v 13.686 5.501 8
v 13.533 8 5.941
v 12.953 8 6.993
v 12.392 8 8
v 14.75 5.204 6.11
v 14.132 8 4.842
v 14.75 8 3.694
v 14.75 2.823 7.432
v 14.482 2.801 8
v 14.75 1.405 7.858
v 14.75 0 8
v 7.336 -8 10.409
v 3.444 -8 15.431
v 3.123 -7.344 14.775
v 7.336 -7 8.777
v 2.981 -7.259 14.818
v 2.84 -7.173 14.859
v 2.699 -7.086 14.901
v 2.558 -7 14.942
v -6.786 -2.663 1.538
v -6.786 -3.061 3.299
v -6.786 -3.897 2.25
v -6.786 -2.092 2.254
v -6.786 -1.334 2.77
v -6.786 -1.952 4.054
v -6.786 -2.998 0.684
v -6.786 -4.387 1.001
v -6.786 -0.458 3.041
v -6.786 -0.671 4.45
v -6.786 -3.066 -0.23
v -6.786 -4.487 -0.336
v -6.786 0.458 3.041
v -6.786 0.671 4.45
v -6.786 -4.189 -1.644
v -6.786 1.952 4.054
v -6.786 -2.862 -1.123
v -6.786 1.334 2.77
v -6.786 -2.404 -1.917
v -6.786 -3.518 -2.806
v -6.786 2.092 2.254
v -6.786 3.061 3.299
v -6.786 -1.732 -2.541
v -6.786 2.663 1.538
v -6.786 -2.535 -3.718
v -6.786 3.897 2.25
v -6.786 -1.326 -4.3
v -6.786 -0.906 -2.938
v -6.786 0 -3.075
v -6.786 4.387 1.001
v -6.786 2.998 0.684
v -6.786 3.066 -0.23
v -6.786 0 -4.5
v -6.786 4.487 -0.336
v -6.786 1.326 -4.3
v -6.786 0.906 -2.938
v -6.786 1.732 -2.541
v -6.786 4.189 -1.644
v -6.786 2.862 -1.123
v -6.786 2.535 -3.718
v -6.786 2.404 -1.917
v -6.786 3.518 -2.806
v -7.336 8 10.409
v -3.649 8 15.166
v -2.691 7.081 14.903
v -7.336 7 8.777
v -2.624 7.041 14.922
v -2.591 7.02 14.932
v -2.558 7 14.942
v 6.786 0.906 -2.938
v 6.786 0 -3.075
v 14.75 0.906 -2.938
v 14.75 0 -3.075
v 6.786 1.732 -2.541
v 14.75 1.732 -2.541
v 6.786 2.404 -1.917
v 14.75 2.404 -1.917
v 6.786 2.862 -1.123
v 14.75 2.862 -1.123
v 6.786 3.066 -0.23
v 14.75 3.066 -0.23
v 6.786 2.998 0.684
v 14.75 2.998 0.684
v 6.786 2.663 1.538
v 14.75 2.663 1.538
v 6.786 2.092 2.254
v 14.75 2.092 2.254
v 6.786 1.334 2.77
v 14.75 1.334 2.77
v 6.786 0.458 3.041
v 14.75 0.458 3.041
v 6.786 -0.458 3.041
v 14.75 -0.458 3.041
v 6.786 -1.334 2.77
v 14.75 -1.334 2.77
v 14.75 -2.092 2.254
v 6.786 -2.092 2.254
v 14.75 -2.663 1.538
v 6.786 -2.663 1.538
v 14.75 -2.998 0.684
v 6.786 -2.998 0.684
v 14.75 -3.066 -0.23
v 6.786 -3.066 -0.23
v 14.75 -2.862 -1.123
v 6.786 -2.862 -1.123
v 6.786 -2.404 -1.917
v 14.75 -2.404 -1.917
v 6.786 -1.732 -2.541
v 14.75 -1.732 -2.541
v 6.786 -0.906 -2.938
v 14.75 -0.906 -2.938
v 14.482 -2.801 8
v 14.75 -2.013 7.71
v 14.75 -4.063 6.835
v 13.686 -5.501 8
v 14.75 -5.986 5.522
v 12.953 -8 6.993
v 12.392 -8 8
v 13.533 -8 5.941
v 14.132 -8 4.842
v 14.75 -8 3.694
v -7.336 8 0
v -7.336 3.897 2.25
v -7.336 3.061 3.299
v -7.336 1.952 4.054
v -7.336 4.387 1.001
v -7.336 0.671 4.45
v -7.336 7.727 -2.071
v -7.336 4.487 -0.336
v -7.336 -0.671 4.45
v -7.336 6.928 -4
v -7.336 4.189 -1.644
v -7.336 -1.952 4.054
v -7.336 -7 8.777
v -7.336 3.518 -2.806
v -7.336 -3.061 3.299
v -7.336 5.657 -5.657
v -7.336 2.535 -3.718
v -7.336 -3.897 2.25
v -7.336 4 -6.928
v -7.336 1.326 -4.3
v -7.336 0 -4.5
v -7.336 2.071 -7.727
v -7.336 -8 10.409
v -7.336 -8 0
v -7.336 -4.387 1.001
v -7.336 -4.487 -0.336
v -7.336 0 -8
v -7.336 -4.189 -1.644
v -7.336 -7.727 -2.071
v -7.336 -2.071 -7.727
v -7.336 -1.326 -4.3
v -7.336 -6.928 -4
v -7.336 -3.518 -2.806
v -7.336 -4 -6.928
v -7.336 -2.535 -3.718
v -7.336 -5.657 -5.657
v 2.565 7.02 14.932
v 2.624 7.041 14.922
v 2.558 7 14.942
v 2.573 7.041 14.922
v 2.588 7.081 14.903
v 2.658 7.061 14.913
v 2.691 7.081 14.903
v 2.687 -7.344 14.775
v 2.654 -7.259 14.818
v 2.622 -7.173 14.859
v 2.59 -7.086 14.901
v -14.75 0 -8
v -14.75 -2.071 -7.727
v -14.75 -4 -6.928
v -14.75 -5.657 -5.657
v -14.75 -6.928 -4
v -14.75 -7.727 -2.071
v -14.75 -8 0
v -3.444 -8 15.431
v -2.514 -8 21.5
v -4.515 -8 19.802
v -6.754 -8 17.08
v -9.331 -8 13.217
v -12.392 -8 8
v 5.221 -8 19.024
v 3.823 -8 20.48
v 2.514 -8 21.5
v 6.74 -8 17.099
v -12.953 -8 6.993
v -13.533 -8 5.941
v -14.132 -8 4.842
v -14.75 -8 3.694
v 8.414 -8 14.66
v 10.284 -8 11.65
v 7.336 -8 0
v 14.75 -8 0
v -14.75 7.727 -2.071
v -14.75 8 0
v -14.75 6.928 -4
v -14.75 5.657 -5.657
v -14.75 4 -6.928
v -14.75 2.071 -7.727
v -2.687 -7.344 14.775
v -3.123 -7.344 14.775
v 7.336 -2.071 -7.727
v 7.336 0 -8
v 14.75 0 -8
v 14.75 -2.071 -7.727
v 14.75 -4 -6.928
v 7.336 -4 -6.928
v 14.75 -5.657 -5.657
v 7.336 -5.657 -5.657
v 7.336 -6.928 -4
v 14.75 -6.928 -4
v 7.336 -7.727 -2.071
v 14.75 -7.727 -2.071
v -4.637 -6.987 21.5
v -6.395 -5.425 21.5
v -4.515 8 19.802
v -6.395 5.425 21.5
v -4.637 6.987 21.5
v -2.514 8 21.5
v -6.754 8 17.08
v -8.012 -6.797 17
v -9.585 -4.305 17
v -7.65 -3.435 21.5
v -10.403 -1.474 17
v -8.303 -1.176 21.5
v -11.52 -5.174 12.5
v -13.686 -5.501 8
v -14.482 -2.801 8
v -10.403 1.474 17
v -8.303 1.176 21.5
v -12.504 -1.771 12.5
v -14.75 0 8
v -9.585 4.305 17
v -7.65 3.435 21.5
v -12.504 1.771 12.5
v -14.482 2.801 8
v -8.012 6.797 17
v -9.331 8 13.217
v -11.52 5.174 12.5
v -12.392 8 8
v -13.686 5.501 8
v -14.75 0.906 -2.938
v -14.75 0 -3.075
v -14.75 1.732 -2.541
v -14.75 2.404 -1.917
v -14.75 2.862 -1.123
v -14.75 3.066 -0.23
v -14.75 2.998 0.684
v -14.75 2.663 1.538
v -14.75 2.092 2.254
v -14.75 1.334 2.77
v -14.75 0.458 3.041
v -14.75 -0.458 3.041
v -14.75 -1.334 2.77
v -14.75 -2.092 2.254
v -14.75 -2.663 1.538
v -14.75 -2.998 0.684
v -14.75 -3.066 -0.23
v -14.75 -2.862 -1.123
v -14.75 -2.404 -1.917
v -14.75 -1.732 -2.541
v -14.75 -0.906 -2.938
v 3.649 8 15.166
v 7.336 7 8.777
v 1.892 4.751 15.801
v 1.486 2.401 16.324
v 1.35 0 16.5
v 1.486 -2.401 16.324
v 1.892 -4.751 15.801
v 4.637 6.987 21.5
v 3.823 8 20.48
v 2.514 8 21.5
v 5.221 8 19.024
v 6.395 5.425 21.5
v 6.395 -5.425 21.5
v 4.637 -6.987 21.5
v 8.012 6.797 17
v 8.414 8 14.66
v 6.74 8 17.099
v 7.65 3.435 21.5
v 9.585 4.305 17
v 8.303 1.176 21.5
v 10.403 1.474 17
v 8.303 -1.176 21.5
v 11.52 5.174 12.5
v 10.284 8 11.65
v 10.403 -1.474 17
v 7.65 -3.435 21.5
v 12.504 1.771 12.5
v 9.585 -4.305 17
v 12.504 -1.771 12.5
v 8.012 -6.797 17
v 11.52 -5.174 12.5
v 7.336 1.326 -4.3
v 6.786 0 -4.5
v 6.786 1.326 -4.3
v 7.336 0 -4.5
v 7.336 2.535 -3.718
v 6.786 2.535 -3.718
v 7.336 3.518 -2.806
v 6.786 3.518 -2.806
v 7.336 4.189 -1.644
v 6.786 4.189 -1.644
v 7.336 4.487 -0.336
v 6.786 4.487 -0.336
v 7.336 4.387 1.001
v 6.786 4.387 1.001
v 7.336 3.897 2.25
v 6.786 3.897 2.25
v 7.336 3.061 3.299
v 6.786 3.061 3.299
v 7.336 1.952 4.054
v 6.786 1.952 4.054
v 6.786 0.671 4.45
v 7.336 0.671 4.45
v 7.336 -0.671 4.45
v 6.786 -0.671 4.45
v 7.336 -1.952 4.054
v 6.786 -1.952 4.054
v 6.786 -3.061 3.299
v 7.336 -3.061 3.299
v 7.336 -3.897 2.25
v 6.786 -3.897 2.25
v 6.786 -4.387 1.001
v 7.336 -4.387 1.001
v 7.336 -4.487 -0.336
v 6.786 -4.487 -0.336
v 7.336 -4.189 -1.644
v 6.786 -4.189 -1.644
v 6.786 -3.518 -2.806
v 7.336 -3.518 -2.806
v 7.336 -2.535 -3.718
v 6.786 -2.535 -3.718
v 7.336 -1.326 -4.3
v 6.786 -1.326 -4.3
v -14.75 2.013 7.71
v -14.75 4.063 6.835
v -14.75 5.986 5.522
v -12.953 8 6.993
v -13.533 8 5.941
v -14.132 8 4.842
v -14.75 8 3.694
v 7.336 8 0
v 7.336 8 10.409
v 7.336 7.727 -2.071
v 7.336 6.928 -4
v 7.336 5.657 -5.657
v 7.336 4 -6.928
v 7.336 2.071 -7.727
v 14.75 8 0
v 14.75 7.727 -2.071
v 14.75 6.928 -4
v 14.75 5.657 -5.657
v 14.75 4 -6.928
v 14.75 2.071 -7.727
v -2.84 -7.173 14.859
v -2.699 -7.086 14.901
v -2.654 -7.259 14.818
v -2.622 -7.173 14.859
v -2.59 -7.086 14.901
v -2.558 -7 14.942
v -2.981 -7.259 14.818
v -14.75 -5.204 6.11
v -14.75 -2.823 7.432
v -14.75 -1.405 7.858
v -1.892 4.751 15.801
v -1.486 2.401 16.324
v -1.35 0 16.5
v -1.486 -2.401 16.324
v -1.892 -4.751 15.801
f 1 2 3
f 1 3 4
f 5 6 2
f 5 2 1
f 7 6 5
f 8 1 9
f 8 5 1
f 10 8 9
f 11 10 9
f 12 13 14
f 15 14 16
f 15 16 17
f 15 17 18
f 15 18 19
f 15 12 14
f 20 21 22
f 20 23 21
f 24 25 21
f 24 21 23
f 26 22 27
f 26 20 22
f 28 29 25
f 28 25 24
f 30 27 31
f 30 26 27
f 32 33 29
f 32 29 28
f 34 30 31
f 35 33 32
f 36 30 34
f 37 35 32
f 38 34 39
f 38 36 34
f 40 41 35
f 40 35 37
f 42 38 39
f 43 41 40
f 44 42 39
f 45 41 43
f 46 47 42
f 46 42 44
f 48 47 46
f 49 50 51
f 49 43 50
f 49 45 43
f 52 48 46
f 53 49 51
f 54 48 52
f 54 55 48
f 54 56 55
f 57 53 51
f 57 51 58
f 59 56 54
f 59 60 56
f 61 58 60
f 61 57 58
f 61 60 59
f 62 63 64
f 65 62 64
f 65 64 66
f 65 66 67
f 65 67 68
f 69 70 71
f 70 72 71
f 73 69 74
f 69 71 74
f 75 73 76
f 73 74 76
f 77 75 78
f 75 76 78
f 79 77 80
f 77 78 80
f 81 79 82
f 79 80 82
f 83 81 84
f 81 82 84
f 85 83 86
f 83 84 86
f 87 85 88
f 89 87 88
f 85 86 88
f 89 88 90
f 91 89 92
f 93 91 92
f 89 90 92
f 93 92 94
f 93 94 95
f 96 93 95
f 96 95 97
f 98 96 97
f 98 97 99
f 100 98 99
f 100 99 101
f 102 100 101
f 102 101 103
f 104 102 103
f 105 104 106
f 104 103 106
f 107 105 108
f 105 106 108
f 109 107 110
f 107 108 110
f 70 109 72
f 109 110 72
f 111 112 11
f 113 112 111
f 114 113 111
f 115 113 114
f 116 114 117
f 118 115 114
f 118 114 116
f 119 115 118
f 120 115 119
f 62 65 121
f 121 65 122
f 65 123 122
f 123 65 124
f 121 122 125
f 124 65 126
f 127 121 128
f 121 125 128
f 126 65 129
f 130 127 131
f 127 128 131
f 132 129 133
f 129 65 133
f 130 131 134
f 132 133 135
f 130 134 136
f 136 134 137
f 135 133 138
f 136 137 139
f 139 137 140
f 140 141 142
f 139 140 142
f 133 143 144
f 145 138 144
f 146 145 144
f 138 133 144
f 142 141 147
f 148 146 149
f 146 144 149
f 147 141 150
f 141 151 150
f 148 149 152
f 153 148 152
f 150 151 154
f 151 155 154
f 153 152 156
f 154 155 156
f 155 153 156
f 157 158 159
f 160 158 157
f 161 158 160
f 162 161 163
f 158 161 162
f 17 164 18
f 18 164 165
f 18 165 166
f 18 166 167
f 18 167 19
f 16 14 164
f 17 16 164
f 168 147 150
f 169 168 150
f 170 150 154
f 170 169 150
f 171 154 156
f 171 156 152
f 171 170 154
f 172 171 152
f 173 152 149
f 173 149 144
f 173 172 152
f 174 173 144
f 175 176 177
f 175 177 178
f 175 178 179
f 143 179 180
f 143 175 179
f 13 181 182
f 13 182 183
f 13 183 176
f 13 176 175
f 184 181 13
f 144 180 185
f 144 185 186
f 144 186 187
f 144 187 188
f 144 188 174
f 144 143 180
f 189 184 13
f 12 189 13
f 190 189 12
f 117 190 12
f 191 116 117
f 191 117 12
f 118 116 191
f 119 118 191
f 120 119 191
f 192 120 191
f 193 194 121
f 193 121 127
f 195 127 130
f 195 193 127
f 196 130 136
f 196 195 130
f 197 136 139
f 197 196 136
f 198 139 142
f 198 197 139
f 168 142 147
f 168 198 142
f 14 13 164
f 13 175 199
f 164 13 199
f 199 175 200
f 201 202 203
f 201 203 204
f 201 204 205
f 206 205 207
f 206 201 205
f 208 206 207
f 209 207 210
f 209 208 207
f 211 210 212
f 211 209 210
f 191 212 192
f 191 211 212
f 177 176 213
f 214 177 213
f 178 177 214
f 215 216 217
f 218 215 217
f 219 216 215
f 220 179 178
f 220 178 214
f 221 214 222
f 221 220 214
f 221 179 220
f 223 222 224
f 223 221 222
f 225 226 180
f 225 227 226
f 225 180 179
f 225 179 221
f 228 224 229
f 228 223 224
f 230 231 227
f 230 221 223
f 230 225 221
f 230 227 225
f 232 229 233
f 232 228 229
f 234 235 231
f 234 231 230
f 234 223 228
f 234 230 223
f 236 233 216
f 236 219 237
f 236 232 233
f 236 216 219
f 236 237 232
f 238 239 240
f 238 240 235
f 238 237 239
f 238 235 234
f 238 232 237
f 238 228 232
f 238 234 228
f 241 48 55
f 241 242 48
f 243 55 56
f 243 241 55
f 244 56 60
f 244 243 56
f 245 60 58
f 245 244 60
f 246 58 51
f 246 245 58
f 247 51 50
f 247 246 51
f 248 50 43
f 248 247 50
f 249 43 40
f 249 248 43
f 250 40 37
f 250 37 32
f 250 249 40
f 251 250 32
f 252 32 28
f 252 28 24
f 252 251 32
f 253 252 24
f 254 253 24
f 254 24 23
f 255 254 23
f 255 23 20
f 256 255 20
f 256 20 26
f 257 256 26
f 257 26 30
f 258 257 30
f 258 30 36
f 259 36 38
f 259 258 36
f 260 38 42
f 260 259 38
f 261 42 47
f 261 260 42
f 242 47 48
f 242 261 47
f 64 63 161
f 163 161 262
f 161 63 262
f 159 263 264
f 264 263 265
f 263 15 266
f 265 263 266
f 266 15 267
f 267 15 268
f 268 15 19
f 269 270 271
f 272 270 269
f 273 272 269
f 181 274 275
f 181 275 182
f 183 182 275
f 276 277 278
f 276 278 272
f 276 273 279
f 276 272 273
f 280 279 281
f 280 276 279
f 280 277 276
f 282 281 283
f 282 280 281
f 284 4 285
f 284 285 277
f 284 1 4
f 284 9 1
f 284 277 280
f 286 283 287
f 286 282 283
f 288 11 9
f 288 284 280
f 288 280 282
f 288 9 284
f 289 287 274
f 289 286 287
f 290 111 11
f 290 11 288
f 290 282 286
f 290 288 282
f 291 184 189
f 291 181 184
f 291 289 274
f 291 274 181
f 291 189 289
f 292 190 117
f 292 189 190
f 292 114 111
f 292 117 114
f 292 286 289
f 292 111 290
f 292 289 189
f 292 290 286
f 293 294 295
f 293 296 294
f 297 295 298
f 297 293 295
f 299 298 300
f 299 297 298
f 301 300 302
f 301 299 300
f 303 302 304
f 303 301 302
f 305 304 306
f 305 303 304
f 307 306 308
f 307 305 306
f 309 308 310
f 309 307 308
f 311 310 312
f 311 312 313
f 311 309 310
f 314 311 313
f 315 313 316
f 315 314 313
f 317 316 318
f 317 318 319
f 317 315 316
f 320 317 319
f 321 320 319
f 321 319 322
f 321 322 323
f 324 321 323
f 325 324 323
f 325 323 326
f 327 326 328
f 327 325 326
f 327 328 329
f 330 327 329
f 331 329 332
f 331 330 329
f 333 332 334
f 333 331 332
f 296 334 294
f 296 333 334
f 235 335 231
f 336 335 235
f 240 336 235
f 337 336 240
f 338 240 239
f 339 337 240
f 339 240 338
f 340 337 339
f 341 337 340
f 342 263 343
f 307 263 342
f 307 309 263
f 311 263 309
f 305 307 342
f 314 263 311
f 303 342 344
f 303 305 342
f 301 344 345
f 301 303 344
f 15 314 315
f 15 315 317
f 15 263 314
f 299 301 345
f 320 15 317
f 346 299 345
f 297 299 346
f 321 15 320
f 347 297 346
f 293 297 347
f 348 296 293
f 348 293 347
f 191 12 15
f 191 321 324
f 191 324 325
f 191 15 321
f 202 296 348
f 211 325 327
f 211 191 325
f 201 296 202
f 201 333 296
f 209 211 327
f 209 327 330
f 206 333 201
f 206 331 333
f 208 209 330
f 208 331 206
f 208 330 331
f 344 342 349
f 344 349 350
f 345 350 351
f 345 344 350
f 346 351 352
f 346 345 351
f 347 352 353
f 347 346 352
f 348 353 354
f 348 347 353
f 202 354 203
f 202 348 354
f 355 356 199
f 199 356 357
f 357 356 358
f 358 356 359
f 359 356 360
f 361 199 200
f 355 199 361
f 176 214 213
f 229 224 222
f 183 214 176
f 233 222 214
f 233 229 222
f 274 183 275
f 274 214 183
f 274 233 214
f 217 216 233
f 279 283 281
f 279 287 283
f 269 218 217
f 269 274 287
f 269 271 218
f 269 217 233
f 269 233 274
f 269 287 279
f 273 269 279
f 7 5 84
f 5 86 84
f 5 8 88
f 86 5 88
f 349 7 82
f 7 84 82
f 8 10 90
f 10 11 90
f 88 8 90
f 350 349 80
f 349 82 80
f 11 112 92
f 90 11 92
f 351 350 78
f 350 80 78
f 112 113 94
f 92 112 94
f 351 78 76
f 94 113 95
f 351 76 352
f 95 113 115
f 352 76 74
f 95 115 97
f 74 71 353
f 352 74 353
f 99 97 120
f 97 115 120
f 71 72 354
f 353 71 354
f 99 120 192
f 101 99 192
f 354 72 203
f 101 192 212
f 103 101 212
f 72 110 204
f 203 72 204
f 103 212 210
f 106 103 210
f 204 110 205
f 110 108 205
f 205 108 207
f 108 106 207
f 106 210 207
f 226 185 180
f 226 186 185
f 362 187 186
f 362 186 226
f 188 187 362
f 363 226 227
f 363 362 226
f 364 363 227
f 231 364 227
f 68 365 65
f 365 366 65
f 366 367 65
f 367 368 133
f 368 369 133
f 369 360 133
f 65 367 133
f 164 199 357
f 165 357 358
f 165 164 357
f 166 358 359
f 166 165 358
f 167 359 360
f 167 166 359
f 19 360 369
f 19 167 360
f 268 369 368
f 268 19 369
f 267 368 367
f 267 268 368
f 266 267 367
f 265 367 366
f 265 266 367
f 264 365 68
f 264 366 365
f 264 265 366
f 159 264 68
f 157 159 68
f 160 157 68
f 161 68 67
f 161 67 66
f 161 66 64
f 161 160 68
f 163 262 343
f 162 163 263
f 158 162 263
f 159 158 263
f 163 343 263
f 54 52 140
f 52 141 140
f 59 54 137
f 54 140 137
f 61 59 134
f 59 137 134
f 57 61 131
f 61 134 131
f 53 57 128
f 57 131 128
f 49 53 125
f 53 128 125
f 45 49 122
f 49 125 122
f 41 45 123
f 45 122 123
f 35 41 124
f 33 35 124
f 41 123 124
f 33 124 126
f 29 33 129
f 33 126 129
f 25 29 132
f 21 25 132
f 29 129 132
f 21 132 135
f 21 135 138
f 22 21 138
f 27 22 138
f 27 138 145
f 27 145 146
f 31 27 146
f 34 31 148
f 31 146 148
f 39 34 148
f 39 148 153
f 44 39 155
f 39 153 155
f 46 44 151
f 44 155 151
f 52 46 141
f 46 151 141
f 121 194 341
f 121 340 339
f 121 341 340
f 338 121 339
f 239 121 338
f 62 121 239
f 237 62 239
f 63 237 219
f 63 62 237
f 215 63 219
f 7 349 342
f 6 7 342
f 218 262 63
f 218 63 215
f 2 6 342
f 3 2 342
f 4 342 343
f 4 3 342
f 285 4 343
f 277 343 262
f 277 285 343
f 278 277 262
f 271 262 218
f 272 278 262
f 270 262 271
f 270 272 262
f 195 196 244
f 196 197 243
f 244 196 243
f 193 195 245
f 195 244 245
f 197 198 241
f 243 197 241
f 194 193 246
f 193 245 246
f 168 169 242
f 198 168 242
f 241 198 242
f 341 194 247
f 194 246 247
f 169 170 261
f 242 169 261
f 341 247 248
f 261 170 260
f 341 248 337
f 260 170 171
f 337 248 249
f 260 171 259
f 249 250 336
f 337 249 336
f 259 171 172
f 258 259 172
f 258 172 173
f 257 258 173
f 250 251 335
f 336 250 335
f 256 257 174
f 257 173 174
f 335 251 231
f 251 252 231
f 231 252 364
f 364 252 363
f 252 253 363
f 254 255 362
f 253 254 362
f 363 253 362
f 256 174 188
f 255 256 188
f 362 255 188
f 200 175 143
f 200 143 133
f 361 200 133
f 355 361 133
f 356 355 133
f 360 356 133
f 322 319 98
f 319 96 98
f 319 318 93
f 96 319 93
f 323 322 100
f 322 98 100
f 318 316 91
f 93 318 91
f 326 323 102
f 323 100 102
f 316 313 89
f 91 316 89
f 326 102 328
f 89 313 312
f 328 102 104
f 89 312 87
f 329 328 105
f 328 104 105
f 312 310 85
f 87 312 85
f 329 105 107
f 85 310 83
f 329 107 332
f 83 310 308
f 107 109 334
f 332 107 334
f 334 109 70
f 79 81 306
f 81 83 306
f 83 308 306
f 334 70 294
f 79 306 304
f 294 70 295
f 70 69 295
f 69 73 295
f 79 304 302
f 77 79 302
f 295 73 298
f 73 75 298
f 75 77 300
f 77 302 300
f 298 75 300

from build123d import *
from OCP.BRepFilletAPI import BRepFilletAPI_MakeChamfer

# Parameters (mm, degrees)
BOSS_EXTRUDE1_DEPTH             = 8
BOSS_EXTRUDE1_DEPTH_BACK        = 8
CUT_EXTRUDE1_DEPTH              = 31.525604007
CUT_EXTRUDE1_DEPTH_BACK         = 31.525604007
SKETCH2_R                       = 3.075
SKETCH4_W                       = 0.549849448
SKETCH4_H                       = 1.425
BOSS_EXTRUDE2_REACH             = 32.526
BOSS_EXTRUDE2_DIRECTION_2_REACH = 32.526
CUT_EXTRUDE3_DEPTH              = 38.467485904
CUT_EXTRUDE3_DEPTH_BACK         = 4
SKETCH12_R                      = 2
CHAMFER1_SIZE                   = 0.5
CHAMFER1_SIZE2                  = 1.045792293
CHAMFER2_SIZE                   = 1
CHAMFER2_SIZE_2                 = 0.735593413


with BuildPart() as part:
    # Sketch1 → Boss-Extrude1 (new, two sides: drawn at the far end of the back side and taken through both)
    with BuildSketch(Plane(origin=(0, 0, 0), x_dir=(1, 0, 0), z_dir=(0, 1, 0)).offset(-BOSS_EXTRUDE1_DEPTH_BACK)):
        Polygon((-7.336249448, 8), (-14.75, 8), (-14.75, -8), (-6.5, -25.5), (6.5, -25.5), (14.75, -8), (14.75, 8), (7.336249448, 8), (7.336249448, -8.776914416), (1.35, -16.5), (-1.35, -16.5), (-7.336249448, -8.776914416), align=None)
    extrude(amount=BOSS_EXTRUDE1_DEPTH + BOSS_EXTRUDE1_DEPTH_BACK)

    # Sketch2 → Cut-Extrude1 (cut, two sides: drawn at the far end of the back side and taken through both)
    with BuildSketch(Plane(origin=(0, 0, 0), x_dir=(0, 0, -1), z_dir=(1, 0, 0)).offset(-CUT_EXTRUDE1_DEPTH_BACK)):
        with BuildLine():
            ThreePointArc((8, -9e-09), (5.656854246, -5.656854253), (0, -8))
            Line((0, -8), (8, -8))
            Line((8, -8), (8, -9e-09))
        make_face()
        with BuildLine():
            ThreePointArc((0, 8), (5.656854253, 5.656854246), (8, -9e-09))
            Line((8, -9e-09), (8, 8))
            Line((8, 8), (0, 8))
        make_face()
        Circle(SKETCH2_R)
    extrude(amount=CUT_EXTRUDE1_DEPTH + CUT_EXTRUDE1_DEPTH_BACK, mode=Mode.SUBTRACT)

    # Sketch4 → Revolve2 (revolve)
    with BuildSketch(Plane(origin=(0, 0, 0), x_dir=(1, 0, 0), z_dir=(0, 1, 0)), mode=Mode.PRIVATE) as revolve2_sk:
        with Locations((7.061324724, -3.7875)):
            Rectangle(SKETCH4_W, SKETCH4_H)
    revolve2 = revolve(revolve2_sk.sketch.rotate(Axis((0, 0, 0), (1, 0, 0)), 180), axis=Axis((0, 0, 0), (1, 0, 0)))

    # Mirror1: Revolve2 across plane
    add(revolve2.mirror(Plane(origin=(0, 0, 0), x_dir=(0, 0, 1), z_dir=(1, 0, 0))))

    # Sketch8 → Cut-Revolve2 (revolve, cut)
    with BuildSketch(Plane(origin=(0, 0, 0), x_dir=(1, 0, 0), z_dir=(0, 1, 0)), mode=Mode.PRIVATE) as cut_revolve2_sk:
        Polygon((6.5, -25.5), (14.75, -8), (39.633624851, 44.783446654), (108.512816048, 26.763980306), (108.512816048, -25.5), align=None)
    revolve(cut_revolve2_sk.sketch.rotate(Axis((0, 0, 16.5), (0, 0, -1)), 208.474191333), axis=Axis((0, 0, 16.5), (0, 0, -1)), mode=Mode.SUBTRACT)

    # Boss-Extrude2: up to this plane
    boss_extrude2_end = Plane(origin=(1.35, -8, 16.5), z_dir=(-0.7903725294702838, 0, -0.6126265295094112))
    # Sketch9 → Boss-Extrude2 (add, up to the surface)
    with BuildSketch(Plane(origin=(0, 0, 0), x_dir=(0, 0, -1), z_dir=(1, 0, 0)), mode=Mode.PRIVATE) as boss_extrude2_sk1:
        with BuildLine():
            Line((-16.5, -9e-08), (-16.5, -8))
            Line((-16.5, -8), (-14.43086969, -8))
            ThreePointArc((-14.43086969, -8), (-15.974344261, -4.131625034), (-16.5, -9e-08))
        make_face()
    boss_extrude2_tool1 = split(extrude(boss_extrude2_sk1.sketch, amount=BOSS_EXTRUDE2_REACH, mode=Mode.PRIVATE), bisect_by=boss_extrude2_end, keep=Keep.BOTH, mode=Mode.PRIVATE)
    add(boss_extrude2_tool1.solids().sort_by_distance((0, -6.025945, 15.886555))[0])
    # Sketch9 → Boss-Extrude2 (add, up to the surface)
    with BuildSketch(Plane(origin=(0, 0, 0), x_dir=(0, 0, -1), z_dir=(1, 0, 0)), mode=Mode.PRIVATE) as boss_extrude2_sk2:
        with BuildLine():
            Line((-16.5, 8), (-16.5, -9e-08))
            ThreePointArc((-16.5, -9e-08), (-15.974344284, 4.131624947), (-14.43086969, 8))
            Line((-14.43086969, 8), (-16.5, 8))
        make_face()
    boss_extrude2_tool2 = split(extrude(boss_extrude2_sk2.sketch, amount=BOSS_EXTRUDE2_REACH, mode=Mode.PRIVATE), bisect_by=boss_extrude2_end, keep=Keep.BOTH, mode=Mode.PRIVATE)
    add(boss_extrude2_tool2.solids().sort_by_distance((0, 6.025945, 15.886555))[0])

    # Boss-Extrude2 direction 2: up to this plane
    boss_extrude2_direction_2_end = Plane(origin=(-1.35, -8, 16.5), z_dir=(0.7903725294702839, 0, -0.612626529509411))
    # Sketch9 → Boss-Extrude2 direction 2 (add, up to the surface)
    with BuildSketch(Plane(origin=(0, 0, 0), x_dir=(0, 0, -1), z_dir=(1, 0, 0)), mode=Mode.PRIVATE) as boss_extrude2_direction_2_sk1:
        with BuildLine():
            Line((-16.5, -9e-08), (-16.5, -8))
            Line((-16.5, -8), (-14.43086969, -8))
            ThreePointArc((-14.43086969, -8), (-15.974344261, -4.131625034), (-16.5, -9e-08))
        make_face()
    boss_extrude2_direction_2_tool1 = split(extrude(boss_extrude2_direction_2_sk1.sketch, amount=-BOSS_EXTRUDE2_DIRECTION_2_REACH, mode=Mode.PRIVATE), bisect_by=boss_extrude2_direction_2_end, keep=Keep.BOTH, mode=Mode.PRIVATE)
    add(boss_extrude2_direction_2_tool1.solids().sort_by_distance((0, -6.025945, 15.886555))[0])
    # Sketch9 → Boss-Extrude2 direction 2 (add, up to the surface)
    with BuildSketch(Plane(origin=(0, 0, 0), x_dir=(0, 0, -1), z_dir=(1, 0, 0)), mode=Mode.PRIVATE) as boss_extrude2_direction_2_sk2:
        with BuildLine():
            Line((-16.5, 8), (-16.5, -9e-08))
            ThreePointArc((-16.5, -9e-08), (-15.974344284, 4.131624947), (-14.43086969, 8))
            Line((-14.43086969, 8), (-16.5, 8))
        make_face()
    boss_extrude2_direction_2_tool2 = split(extrude(boss_extrude2_direction_2_sk2.sketch, amount=-BOSS_EXTRUDE2_DIRECTION_2_REACH, mode=Mode.PRIVATE), bisect_by=boss_extrude2_direction_2_end, keep=Keep.BOTH, mode=Mode.PRIVATE)
    add(boss_extrude2_direction_2_tool2.solids().sort_by_distance((0, 6.025945, 15.886555))[0])

    # Sketch12 → Cut-Extrude3 (cut, two sides: drawn at the far end of the back side and taken through both)
    with BuildSketch(Plane.XY.offset(25.5).offset(-CUT_EXTRUDE3_DEPTH_BACK)):
        with Locations(Location((0, 0, 0), (0, 0, 180))):
            Circle(SKETCH12_R)
    extrude(amount=CUT_EXTRUDE3_DEPTH + CUT_EXTRUDE3_DEPTH_BACK, mode=Mode.SUBTRACT)

    # Chamfer1: one chamfer whose edges measure the first distance from different faces: ONE call of the kernel's chamfer builder (chamfer() names one face for all edges)
    chamfer1_edges_1 = [part.edges().sort_by_distance(p)[0] for p in [
        (5.713707726, -3.098958538, 25.5),
    ]]
    chamfer1_side_1 = [part.faces().sort_by_distance(p)[0] for p in [
        (10.231854722, -5.54947769, 14.597156153),
    ]]
    chamfer1_edges_2 = [part.edges().sort_by_distance(p)[0] for p in [
        (2, 0, 25.5),
    ]]
    chamfer1 = BRepFilletAPI_MakeChamfer(part.part.solid().wrapped)
    for e in chamfer1_edges_1:
        chamfer1.Add(CHAMFER1_SIZE, CHAMFER1_SIZE2, e.wrapped, chamfer1_side_1[0].wrapped)  # the first distance lies on this face
    for e in chamfer1_edges_2:
        chamfer1.Add(CHAMFER1_SIZE, e.wrapped)
    add(Compound.cast(chamfer1.Shape()), mode=Mode.REPLACE)

    # Chamfer2
    # the kernel refuses this chamfer: 1, 0.735593413 mm, written as the material it takes off along each edge
    with BuildSketch(Plane(origin=(8.911730672, 8, 6.744326828), x_dir=(0.7903725294702837, 0, 0.6126265295094113), z_dir=(-0.6126265295094113, 0, 0.7903725294702838))) as chamfer2_piece_1_section:
        Polygon((CHAMFER2_SIZE, 0), (0, -CHAMFER2_SIZE), (0, 0), align=None)
    chamfer2_piece_1 = extrude(amount=12.296898092, mode=Mode.PRIVATE)
    chamfer2_piece_1 = split(chamfer2_piece_1, bisect_by=Plane(origin=(7.336249448, 8, 6.744326828), z_dir=(-1, 0, 0)), keep=Keep.TOP, mode=Mode.PRIVATE)
    chamfer2_piece_1 = chamfer2_piece_1 & Plane(origin=(8.911730672, 0, 0), x_dir=(0, -5.438658574002453e-09, 1.0), z_dir=(-1, 0, 0)) * Cylinder(16.5, 29, mode=Mode.PRIVATE)
    add(chamfer2_piece_1, mode=Mode.SUBTRACT)
    with BuildSketch(Plane(origin=(8.911730672, -8, 6.744326828), x_dir=(0.7903725294702837, 0, 0.6126265295094113), z_dir=(-0.6126265295094113, 0, 0.7903725294702838))) as chamfer2_piece_2_section:
        Polygon((CHAMFER2_SIZE, 0), (0, CHAMFER2_SIZE), (0, 0), align=None)
    chamfer2_piece_2 = extrude(amount=12.296898092, mode=Mode.PRIVATE)
    chamfer2_piece_2 = split(chamfer2_piece_2, bisect_by=Plane(origin=(7.336249448, -8, 6.744326828), z_dir=(-1, 0, 0)), keep=Keep.TOP, mode=Mode.PRIVATE)
    chamfer2_piece_2 = chamfer2_piece_2 & Plane(origin=(8.911730672, 0, 0), x_dir=(0, -0.48484848484848475, 0.8745981630098069), z_dir=(-1, 0, 0)) * Cylinder(16.5, 29, mode=Mode.PRIVATE)
    add(chamfer2_piece_2, mode=Mode.SUBTRACT)
    with BuildSketch(Plane(origin=(-1.37832467, 8, 16.463457278), x_dir=(-0.7903725294702839, 0, 0.6126265295094111), z_dir=(-0.6126265295094111, 0, -0.7903725294702839))) as chamfer2_piece_3_section:
        Polygon((CHAMFER2_SIZE, 0), (0, -CHAMFER2_SIZE), (0, 0), align=None)
    chamfer2_piece_3 = extrude(amount=12.296898092, mode=Mode.PRIVATE)
    chamfer2_piece_3 = split(chamfer2_piece_3, bisect_by=Plane(origin=(-7.336249448, 8, 16.463457278), z_dir=(1, 0, 0)), keep=Keep.TOP, mode=Mode.PRIVATE)
    chamfer2_piece_3 = chamfer2_piece_3 & Plane(origin=(-1.37832467, 0, 0), x_dir=(0, -5.438658574002453e-09, 1.0), z_dir=(1, 0, 0)) * Cylinder(16.5, 29, mode=Mode.PRIVATE)
    add(chamfer2_piece_3, mode=Mode.SUBTRACT)
    with BuildSketch(Plane(origin=(-1.37832467, -8, 16.463457278), x_dir=(-0.7903725294702838, 0, 0.6126265295094111), z_dir=(-0.6126265295094111, 0, -0.7903725294702839))) as chamfer2_piece_4_section:
        Polygon((CHAMFER2_SIZE, 0), (0, CHAMFER2_SIZE), (0, 0), align=None)
    chamfer2_piece_4 = extrude(amount=12.296898092, mode=Mode.PRIVATE)
    chamfer2_piece_4 = chamfer2_piece_4 & Plane(origin=(-1.37832467, 0, 0), x_dir=(0, -0.48484848484848475, 0.8745981630098069), z_dir=(1, 0, 0)) * Cylinder(16.5, 29, mode=Mode.PRIVATE)
    chamfer2_piece_4 = split(chamfer2_piece_4, bisect_by=Plane(origin=(-7.336249448, -8, 16.463457278), z_dir=(1, 0, 0)), keep=Keep.TOP, mode=Mode.PRIVATE)
    add(chamfer2_piece_4, mode=Mode.SUBTRACT)
    with BuildSketch(Plane(origin=(0, 8, 14.43086969), x_dir=(0, 0, 1), z_dir=(-1, 0, 0))) as chamfer2_piece_5_section:
        with BuildLine():
            Line((CHAMFER2_SIZE_2, 0), (0.47224964, -0.918542928))
            ThreePointArc((0.47224964, -0.918542928), (0.2499823, -0.46856024), (0, 0))
            Line((0, 0), (CHAMFER2_SIZE_2, 0))
        make_face()
    chamfer2_piece_5 = extrude(amount=5.609656259, mode=Mode.PRIVATE)
    chamfer2_piece_5 = split(chamfer2_piece_5, bisect_by=Plane(origin=(-1.845209268, 8, 15.861111896), z_dir=(0.7903725294702839, 0, -0.6126265295094111)), keep=Keep.TOP, mode=Mode.PRIVATE)
    add(chamfer2_piece_5, mode=Mode.SUBTRACT)
    with BuildSketch(Plane(origin=(0, -8, 14.43086969), x_dir=(0, 0, 1), z_dir=(-1, 0, 0))) as chamfer2_piece_6_section:
        with BuildLine():
            Line((CHAMFER2_SIZE, 0), (0.344426995, 0.655573005))
            ThreePointArc((0.344426995, 0.655573005), (0.17865839, 0.331122032), (0, 0))
            Line((0, 0), (CHAMFER2_SIZE, 0))
        make_face()
    chamfer2_piece_6 = extrude(amount=5.525488882, mode=Mode.PRIVATE)
    chamfer2_piece_6 = split(chamfer2_piece_6, bisect_by=Plane(origin=(-1.845209268, -8, 15.861111896), z_dir=(0.7903725294702839, 0, -0.6126265295094111)), keep=Keep.TOP, mode=Mode.PRIVATE)
    add(chamfer2_piece_6, mode=Mode.SUBTRACT)
    with BuildSketch(Plane(origin=(0, -8, 14.43086969), x_dir=(0, 0, 1), z_dir=(1, 0, 0))) as chamfer2_piece_7_section:
        with BuildLine():
            Line((CHAMFER2_SIZE, 0), (0.344426995, -0.655573005))
            ThreePointArc((0.344426995, -0.655573005), (0.17865839, -0.331122032), (0, 0))
            Line((0, 0), (CHAMFER2_SIZE, 0))
        make_face()
    chamfer2_piece_7 = extrude(amount=5.525488882, mode=Mode.PRIVATE)
    chamfer2_piece_7 = split(chamfer2_piece_7, bisect_by=Plane(origin=(1.845209268, -8, 15.861111896), z_dir=(-0.7903725294702837, 0, -0.6126265295094113)), keep=Keep.TOP, mode=Mode.PRIVATE)
    add(chamfer2_piece_7, mode=Mode.SUBTRACT)
    with BuildSketch(Plane(origin=(0, 8, 14.43086969), x_dir=(0, 0, 1), z_dir=(1, 0, 0))) as chamfer2_piece_8_section:
        with BuildLine():
            Line((CHAMFER2_SIZE_2, 0), (0.47224964, 0.918542928))
            ThreePointArc((0.47224964, 0.918542928), (0.2499823, 0.46856024), (0, 0))
            Line((0, 0), (CHAMFER2_SIZE_2, 0))
        make_face()
    chamfer2_piece_8 = extrude(amount=5.609656259, mode=Mode.PRIVATE)
    chamfer2_piece_8 = split(chamfer2_piece_8, bisect_by=Plane(origin=(1.845209268, 8, 15.861111896), z_dir=(-0.7903725294702837, 0, -0.6126265295094113)), keep=Keep.TOP, mode=Mode.PRIVATE)
    add(chamfer2_piece_8, mode=Mode.SUBTRACT)
    with BuildSketch(Plane(origin=(8.911730672, 8, 6.744326828), x_dir=(0.7903725294702837, 0, 0.6126265295094113), z_dir=(-0.6126265295094113, 0, 0.7903725294702838))) as chamfer2_piece_9a_section:
        Polygon((CHAMFER2_SIZE, 0), (0, -CHAMFER2_SIZE), (0, 0), align=None)
    chamfer2_piece_9a = extrude(amount=12.296898092, mode=Mode.PRIVATE)
    chamfer2_piece_9a = chamfer2_piece_9a - Plane(origin=(8.911730672, 0, 0), x_dir=(0, -5.438658574002453e-09, 1.0), z_dir=(-1, 0, 0)) * Cylinder(16.5, 29, mode=Mode.PRIVATE)
    with BuildSketch(Plane(origin=(0, 8, 14.43086969), x_dir=(0, 0, 1), z_dir=(1, 0, 0))) as chamfer2_piece_9b_section:
        with BuildLine():
            Line((CHAMFER2_SIZE_2, 0), (0.47224964, 0.918542928))
            ThreePointArc((0.47224964, 0.918542928), (0.2499823, 0.46856024), (0, 0))
            Line((0, 0), (CHAMFER2_SIZE_2, 0))
        make_face()
    chamfer2_piece_9b = extrude(amount=5.609656259, mode=Mode.PRIVATE)
    chamfer2_piece_9b = split(chamfer2_piece_9b, bisect_by=Plane(origin=(1.845209268, 8, 15.861111896), z_dir=(0.7903725294702837, 0, 0.6126265295094113)), keep=Keep.TOP, mode=Mode.PRIVATE)
    chamfer2_piece_9 = chamfer2_piece_9a & chamfer2_piece_9b
    add(chamfer2_piece_9, mode=Mode.SUBTRACT)
    with BuildSketch(Plane(origin=(8.911730672, -8, 6.744326828), x_dir=(0.7903725294702837, 0, 0.6126265295094113), z_dir=(-0.6126265295094113, 0, 0.7903725294702838))) as chamfer2_piece_10a_section:
        Polygon((CHAMFER2_SIZE, 0), (0, CHAMFER2_SIZE), (0, 0), align=None)
    chamfer2_piece_10a = extrude(amount=12.296898092, mode=Mode.PRIVATE)
    chamfer2_piece_10a = chamfer2_piece_10a - Plane(origin=(8.911730672, 0, 0), x_dir=(0, -0.48484848484848475, 0.8745981630098069), z_dir=(-1, 0, 0)) * Cylinder(16.5, 29, mode=Mode.PRIVATE)
    with BuildSketch(Plane(origin=(0, -8, 14.43086969), x_dir=(0, 0, 1), z_dir=(1, 0, 0))) as chamfer2_piece_10b_section:
        with BuildLine():
            Line((CHAMFER2_SIZE, 0), (0.344426995, -0.655573005))
            ThreePointArc((0.344426995, -0.655573005), (0.17865839, -0.331122032), (0, 0))
            Line((0, 0), (CHAMFER2_SIZE, 0))
        make_face()
    chamfer2_piece_10b = extrude(amount=5.525488882, mode=Mode.PRIVATE)
    chamfer2_piece_10b = split(chamfer2_piece_10b, bisect_by=Plane(origin=(1.845209268, -8, 15.861111896), z_dir=(0.7903725294702837, 0, 0.6126265295094113)), keep=Keep.TOP, mode=Mode.PRIVATE)
    chamfer2_piece_10 = chamfer2_piece_10a & chamfer2_piece_10b
    add(chamfer2_piece_10, mode=Mode.SUBTRACT)
    with BuildSketch(Plane(origin=(-1.37832467, 8, 16.463457278), x_dir=(-0.7903725294702839, 0, 0.6126265295094111), z_dir=(-0.6126265295094111, 0, -0.7903725294702839))) as chamfer2_piece_11a_section:
        Polygon((CHAMFER2_SIZE, 0), (0, -CHAMFER2_SIZE), (0, 0), align=None)
    chamfer2_piece_11a = extrude(amount=12.296898092, mode=Mode.PRIVATE)
    chamfer2_piece_11a = chamfer2_piece_11a - Plane(origin=(-1.37832467, 0, 0), x_dir=(0, -5.438658574002453e-09, 1.0), z_dir=(1, 0, 0)) * Cylinder(16.5, 29, mode=Mode.PRIVATE)
    with BuildSketch(Plane(origin=(0, 8, 14.43086969), x_dir=(0, 0, 1), z_dir=(-1, 0, 0))) as chamfer2_piece_11b_section:
        with BuildLine():
            Line((CHAMFER2_SIZE_2, 0), (0.47224964, -0.918542928))
            ThreePointArc((0.47224964, -0.918542928), (0.2499823, -0.46856024), (0, 0))
            Line((0, 0), (CHAMFER2_SIZE_2, 0))
        make_face()
    chamfer2_piece_11b = extrude(amount=5.609656259, mode=Mode.PRIVATE)
    chamfer2_piece_11b = split(chamfer2_piece_11b, bisect_by=Plane(origin=(-1.845209268, 8, 15.861111896), z_dir=(-0.7903725294702839, 0, 0.6126265295094111)), keep=Keep.TOP, mode=Mode.PRIVATE)
    chamfer2_piece_11 = chamfer2_piece_11a & chamfer2_piece_11b
    add(chamfer2_piece_11, mode=Mode.SUBTRACT)
    with BuildSketch(Plane(origin=(-1.37832467, -8, 16.463457278), x_dir=(-0.7903725294702838, 0, 0.6126265295094111), z_dir=(-0.6126265295094111, 0, -0.7903725294702839))) as chamfer2_piece_12a_section:
        Polygon((CHAMFER2_SIZE, 0), (0, CHAMFER2_SIZE), (0, 0), align=None)
    chamfer2_piece_12a = extrude(amount=12.296898092, mode=Mode.PRIVATE)
    chamfer2_piece_12a = chamfer2_piece_12a - Plane(origin=(-1.37832467, 0, 0), x_dir=(0, -0.48484848484848475, 0.8745981630098069), z_dir=(1, 0, 0)) * Cylinder(16.5, 29, mode=Mode.PRIVATE)
    with BuildSketch(Plane(origin=(0, -8, 14.43086969), x_dir=(0, 0, 1), z_dir=(-1, 0, 0))) as chamfer2_piece_12b_section:
        with BuildLine():
            Line((CHAMFER2_SIZE, 0), (0.344426995, 0.655573005))
            ThreePointArc((0.344426995, 0.655573005), (0.17865839, 0.331122032), (0, 0))
            Line((0, 0), (CHAMFER2_SIZE, 0))
        make_face()
    chamfer2_piece_12b = extrude(amount=5.525488882, mode=Mode.PRIVATE)
    chamfer2_piece_12b = split(chamfer2_piece_12b, bisect_by=Plane(origin=(-1.845209268, -8, 15.861111896), z_dir=(-0.7903725294702839, 0, 0.6126265295094111)), keep=Keep.TOP, mode=Mode.PRIVATE)
    chamfer2_piece_12 = chamfer2_piece_12a & chamfer2_piece_12b
    add(chamfer2_piece_12, mode=Mode.SUBTRACT)

    # SurfaceCut1
    split(bisect_by=Plane.XY.offset(21.5), keep=Keep.BOTTOM)


solid = part.part
